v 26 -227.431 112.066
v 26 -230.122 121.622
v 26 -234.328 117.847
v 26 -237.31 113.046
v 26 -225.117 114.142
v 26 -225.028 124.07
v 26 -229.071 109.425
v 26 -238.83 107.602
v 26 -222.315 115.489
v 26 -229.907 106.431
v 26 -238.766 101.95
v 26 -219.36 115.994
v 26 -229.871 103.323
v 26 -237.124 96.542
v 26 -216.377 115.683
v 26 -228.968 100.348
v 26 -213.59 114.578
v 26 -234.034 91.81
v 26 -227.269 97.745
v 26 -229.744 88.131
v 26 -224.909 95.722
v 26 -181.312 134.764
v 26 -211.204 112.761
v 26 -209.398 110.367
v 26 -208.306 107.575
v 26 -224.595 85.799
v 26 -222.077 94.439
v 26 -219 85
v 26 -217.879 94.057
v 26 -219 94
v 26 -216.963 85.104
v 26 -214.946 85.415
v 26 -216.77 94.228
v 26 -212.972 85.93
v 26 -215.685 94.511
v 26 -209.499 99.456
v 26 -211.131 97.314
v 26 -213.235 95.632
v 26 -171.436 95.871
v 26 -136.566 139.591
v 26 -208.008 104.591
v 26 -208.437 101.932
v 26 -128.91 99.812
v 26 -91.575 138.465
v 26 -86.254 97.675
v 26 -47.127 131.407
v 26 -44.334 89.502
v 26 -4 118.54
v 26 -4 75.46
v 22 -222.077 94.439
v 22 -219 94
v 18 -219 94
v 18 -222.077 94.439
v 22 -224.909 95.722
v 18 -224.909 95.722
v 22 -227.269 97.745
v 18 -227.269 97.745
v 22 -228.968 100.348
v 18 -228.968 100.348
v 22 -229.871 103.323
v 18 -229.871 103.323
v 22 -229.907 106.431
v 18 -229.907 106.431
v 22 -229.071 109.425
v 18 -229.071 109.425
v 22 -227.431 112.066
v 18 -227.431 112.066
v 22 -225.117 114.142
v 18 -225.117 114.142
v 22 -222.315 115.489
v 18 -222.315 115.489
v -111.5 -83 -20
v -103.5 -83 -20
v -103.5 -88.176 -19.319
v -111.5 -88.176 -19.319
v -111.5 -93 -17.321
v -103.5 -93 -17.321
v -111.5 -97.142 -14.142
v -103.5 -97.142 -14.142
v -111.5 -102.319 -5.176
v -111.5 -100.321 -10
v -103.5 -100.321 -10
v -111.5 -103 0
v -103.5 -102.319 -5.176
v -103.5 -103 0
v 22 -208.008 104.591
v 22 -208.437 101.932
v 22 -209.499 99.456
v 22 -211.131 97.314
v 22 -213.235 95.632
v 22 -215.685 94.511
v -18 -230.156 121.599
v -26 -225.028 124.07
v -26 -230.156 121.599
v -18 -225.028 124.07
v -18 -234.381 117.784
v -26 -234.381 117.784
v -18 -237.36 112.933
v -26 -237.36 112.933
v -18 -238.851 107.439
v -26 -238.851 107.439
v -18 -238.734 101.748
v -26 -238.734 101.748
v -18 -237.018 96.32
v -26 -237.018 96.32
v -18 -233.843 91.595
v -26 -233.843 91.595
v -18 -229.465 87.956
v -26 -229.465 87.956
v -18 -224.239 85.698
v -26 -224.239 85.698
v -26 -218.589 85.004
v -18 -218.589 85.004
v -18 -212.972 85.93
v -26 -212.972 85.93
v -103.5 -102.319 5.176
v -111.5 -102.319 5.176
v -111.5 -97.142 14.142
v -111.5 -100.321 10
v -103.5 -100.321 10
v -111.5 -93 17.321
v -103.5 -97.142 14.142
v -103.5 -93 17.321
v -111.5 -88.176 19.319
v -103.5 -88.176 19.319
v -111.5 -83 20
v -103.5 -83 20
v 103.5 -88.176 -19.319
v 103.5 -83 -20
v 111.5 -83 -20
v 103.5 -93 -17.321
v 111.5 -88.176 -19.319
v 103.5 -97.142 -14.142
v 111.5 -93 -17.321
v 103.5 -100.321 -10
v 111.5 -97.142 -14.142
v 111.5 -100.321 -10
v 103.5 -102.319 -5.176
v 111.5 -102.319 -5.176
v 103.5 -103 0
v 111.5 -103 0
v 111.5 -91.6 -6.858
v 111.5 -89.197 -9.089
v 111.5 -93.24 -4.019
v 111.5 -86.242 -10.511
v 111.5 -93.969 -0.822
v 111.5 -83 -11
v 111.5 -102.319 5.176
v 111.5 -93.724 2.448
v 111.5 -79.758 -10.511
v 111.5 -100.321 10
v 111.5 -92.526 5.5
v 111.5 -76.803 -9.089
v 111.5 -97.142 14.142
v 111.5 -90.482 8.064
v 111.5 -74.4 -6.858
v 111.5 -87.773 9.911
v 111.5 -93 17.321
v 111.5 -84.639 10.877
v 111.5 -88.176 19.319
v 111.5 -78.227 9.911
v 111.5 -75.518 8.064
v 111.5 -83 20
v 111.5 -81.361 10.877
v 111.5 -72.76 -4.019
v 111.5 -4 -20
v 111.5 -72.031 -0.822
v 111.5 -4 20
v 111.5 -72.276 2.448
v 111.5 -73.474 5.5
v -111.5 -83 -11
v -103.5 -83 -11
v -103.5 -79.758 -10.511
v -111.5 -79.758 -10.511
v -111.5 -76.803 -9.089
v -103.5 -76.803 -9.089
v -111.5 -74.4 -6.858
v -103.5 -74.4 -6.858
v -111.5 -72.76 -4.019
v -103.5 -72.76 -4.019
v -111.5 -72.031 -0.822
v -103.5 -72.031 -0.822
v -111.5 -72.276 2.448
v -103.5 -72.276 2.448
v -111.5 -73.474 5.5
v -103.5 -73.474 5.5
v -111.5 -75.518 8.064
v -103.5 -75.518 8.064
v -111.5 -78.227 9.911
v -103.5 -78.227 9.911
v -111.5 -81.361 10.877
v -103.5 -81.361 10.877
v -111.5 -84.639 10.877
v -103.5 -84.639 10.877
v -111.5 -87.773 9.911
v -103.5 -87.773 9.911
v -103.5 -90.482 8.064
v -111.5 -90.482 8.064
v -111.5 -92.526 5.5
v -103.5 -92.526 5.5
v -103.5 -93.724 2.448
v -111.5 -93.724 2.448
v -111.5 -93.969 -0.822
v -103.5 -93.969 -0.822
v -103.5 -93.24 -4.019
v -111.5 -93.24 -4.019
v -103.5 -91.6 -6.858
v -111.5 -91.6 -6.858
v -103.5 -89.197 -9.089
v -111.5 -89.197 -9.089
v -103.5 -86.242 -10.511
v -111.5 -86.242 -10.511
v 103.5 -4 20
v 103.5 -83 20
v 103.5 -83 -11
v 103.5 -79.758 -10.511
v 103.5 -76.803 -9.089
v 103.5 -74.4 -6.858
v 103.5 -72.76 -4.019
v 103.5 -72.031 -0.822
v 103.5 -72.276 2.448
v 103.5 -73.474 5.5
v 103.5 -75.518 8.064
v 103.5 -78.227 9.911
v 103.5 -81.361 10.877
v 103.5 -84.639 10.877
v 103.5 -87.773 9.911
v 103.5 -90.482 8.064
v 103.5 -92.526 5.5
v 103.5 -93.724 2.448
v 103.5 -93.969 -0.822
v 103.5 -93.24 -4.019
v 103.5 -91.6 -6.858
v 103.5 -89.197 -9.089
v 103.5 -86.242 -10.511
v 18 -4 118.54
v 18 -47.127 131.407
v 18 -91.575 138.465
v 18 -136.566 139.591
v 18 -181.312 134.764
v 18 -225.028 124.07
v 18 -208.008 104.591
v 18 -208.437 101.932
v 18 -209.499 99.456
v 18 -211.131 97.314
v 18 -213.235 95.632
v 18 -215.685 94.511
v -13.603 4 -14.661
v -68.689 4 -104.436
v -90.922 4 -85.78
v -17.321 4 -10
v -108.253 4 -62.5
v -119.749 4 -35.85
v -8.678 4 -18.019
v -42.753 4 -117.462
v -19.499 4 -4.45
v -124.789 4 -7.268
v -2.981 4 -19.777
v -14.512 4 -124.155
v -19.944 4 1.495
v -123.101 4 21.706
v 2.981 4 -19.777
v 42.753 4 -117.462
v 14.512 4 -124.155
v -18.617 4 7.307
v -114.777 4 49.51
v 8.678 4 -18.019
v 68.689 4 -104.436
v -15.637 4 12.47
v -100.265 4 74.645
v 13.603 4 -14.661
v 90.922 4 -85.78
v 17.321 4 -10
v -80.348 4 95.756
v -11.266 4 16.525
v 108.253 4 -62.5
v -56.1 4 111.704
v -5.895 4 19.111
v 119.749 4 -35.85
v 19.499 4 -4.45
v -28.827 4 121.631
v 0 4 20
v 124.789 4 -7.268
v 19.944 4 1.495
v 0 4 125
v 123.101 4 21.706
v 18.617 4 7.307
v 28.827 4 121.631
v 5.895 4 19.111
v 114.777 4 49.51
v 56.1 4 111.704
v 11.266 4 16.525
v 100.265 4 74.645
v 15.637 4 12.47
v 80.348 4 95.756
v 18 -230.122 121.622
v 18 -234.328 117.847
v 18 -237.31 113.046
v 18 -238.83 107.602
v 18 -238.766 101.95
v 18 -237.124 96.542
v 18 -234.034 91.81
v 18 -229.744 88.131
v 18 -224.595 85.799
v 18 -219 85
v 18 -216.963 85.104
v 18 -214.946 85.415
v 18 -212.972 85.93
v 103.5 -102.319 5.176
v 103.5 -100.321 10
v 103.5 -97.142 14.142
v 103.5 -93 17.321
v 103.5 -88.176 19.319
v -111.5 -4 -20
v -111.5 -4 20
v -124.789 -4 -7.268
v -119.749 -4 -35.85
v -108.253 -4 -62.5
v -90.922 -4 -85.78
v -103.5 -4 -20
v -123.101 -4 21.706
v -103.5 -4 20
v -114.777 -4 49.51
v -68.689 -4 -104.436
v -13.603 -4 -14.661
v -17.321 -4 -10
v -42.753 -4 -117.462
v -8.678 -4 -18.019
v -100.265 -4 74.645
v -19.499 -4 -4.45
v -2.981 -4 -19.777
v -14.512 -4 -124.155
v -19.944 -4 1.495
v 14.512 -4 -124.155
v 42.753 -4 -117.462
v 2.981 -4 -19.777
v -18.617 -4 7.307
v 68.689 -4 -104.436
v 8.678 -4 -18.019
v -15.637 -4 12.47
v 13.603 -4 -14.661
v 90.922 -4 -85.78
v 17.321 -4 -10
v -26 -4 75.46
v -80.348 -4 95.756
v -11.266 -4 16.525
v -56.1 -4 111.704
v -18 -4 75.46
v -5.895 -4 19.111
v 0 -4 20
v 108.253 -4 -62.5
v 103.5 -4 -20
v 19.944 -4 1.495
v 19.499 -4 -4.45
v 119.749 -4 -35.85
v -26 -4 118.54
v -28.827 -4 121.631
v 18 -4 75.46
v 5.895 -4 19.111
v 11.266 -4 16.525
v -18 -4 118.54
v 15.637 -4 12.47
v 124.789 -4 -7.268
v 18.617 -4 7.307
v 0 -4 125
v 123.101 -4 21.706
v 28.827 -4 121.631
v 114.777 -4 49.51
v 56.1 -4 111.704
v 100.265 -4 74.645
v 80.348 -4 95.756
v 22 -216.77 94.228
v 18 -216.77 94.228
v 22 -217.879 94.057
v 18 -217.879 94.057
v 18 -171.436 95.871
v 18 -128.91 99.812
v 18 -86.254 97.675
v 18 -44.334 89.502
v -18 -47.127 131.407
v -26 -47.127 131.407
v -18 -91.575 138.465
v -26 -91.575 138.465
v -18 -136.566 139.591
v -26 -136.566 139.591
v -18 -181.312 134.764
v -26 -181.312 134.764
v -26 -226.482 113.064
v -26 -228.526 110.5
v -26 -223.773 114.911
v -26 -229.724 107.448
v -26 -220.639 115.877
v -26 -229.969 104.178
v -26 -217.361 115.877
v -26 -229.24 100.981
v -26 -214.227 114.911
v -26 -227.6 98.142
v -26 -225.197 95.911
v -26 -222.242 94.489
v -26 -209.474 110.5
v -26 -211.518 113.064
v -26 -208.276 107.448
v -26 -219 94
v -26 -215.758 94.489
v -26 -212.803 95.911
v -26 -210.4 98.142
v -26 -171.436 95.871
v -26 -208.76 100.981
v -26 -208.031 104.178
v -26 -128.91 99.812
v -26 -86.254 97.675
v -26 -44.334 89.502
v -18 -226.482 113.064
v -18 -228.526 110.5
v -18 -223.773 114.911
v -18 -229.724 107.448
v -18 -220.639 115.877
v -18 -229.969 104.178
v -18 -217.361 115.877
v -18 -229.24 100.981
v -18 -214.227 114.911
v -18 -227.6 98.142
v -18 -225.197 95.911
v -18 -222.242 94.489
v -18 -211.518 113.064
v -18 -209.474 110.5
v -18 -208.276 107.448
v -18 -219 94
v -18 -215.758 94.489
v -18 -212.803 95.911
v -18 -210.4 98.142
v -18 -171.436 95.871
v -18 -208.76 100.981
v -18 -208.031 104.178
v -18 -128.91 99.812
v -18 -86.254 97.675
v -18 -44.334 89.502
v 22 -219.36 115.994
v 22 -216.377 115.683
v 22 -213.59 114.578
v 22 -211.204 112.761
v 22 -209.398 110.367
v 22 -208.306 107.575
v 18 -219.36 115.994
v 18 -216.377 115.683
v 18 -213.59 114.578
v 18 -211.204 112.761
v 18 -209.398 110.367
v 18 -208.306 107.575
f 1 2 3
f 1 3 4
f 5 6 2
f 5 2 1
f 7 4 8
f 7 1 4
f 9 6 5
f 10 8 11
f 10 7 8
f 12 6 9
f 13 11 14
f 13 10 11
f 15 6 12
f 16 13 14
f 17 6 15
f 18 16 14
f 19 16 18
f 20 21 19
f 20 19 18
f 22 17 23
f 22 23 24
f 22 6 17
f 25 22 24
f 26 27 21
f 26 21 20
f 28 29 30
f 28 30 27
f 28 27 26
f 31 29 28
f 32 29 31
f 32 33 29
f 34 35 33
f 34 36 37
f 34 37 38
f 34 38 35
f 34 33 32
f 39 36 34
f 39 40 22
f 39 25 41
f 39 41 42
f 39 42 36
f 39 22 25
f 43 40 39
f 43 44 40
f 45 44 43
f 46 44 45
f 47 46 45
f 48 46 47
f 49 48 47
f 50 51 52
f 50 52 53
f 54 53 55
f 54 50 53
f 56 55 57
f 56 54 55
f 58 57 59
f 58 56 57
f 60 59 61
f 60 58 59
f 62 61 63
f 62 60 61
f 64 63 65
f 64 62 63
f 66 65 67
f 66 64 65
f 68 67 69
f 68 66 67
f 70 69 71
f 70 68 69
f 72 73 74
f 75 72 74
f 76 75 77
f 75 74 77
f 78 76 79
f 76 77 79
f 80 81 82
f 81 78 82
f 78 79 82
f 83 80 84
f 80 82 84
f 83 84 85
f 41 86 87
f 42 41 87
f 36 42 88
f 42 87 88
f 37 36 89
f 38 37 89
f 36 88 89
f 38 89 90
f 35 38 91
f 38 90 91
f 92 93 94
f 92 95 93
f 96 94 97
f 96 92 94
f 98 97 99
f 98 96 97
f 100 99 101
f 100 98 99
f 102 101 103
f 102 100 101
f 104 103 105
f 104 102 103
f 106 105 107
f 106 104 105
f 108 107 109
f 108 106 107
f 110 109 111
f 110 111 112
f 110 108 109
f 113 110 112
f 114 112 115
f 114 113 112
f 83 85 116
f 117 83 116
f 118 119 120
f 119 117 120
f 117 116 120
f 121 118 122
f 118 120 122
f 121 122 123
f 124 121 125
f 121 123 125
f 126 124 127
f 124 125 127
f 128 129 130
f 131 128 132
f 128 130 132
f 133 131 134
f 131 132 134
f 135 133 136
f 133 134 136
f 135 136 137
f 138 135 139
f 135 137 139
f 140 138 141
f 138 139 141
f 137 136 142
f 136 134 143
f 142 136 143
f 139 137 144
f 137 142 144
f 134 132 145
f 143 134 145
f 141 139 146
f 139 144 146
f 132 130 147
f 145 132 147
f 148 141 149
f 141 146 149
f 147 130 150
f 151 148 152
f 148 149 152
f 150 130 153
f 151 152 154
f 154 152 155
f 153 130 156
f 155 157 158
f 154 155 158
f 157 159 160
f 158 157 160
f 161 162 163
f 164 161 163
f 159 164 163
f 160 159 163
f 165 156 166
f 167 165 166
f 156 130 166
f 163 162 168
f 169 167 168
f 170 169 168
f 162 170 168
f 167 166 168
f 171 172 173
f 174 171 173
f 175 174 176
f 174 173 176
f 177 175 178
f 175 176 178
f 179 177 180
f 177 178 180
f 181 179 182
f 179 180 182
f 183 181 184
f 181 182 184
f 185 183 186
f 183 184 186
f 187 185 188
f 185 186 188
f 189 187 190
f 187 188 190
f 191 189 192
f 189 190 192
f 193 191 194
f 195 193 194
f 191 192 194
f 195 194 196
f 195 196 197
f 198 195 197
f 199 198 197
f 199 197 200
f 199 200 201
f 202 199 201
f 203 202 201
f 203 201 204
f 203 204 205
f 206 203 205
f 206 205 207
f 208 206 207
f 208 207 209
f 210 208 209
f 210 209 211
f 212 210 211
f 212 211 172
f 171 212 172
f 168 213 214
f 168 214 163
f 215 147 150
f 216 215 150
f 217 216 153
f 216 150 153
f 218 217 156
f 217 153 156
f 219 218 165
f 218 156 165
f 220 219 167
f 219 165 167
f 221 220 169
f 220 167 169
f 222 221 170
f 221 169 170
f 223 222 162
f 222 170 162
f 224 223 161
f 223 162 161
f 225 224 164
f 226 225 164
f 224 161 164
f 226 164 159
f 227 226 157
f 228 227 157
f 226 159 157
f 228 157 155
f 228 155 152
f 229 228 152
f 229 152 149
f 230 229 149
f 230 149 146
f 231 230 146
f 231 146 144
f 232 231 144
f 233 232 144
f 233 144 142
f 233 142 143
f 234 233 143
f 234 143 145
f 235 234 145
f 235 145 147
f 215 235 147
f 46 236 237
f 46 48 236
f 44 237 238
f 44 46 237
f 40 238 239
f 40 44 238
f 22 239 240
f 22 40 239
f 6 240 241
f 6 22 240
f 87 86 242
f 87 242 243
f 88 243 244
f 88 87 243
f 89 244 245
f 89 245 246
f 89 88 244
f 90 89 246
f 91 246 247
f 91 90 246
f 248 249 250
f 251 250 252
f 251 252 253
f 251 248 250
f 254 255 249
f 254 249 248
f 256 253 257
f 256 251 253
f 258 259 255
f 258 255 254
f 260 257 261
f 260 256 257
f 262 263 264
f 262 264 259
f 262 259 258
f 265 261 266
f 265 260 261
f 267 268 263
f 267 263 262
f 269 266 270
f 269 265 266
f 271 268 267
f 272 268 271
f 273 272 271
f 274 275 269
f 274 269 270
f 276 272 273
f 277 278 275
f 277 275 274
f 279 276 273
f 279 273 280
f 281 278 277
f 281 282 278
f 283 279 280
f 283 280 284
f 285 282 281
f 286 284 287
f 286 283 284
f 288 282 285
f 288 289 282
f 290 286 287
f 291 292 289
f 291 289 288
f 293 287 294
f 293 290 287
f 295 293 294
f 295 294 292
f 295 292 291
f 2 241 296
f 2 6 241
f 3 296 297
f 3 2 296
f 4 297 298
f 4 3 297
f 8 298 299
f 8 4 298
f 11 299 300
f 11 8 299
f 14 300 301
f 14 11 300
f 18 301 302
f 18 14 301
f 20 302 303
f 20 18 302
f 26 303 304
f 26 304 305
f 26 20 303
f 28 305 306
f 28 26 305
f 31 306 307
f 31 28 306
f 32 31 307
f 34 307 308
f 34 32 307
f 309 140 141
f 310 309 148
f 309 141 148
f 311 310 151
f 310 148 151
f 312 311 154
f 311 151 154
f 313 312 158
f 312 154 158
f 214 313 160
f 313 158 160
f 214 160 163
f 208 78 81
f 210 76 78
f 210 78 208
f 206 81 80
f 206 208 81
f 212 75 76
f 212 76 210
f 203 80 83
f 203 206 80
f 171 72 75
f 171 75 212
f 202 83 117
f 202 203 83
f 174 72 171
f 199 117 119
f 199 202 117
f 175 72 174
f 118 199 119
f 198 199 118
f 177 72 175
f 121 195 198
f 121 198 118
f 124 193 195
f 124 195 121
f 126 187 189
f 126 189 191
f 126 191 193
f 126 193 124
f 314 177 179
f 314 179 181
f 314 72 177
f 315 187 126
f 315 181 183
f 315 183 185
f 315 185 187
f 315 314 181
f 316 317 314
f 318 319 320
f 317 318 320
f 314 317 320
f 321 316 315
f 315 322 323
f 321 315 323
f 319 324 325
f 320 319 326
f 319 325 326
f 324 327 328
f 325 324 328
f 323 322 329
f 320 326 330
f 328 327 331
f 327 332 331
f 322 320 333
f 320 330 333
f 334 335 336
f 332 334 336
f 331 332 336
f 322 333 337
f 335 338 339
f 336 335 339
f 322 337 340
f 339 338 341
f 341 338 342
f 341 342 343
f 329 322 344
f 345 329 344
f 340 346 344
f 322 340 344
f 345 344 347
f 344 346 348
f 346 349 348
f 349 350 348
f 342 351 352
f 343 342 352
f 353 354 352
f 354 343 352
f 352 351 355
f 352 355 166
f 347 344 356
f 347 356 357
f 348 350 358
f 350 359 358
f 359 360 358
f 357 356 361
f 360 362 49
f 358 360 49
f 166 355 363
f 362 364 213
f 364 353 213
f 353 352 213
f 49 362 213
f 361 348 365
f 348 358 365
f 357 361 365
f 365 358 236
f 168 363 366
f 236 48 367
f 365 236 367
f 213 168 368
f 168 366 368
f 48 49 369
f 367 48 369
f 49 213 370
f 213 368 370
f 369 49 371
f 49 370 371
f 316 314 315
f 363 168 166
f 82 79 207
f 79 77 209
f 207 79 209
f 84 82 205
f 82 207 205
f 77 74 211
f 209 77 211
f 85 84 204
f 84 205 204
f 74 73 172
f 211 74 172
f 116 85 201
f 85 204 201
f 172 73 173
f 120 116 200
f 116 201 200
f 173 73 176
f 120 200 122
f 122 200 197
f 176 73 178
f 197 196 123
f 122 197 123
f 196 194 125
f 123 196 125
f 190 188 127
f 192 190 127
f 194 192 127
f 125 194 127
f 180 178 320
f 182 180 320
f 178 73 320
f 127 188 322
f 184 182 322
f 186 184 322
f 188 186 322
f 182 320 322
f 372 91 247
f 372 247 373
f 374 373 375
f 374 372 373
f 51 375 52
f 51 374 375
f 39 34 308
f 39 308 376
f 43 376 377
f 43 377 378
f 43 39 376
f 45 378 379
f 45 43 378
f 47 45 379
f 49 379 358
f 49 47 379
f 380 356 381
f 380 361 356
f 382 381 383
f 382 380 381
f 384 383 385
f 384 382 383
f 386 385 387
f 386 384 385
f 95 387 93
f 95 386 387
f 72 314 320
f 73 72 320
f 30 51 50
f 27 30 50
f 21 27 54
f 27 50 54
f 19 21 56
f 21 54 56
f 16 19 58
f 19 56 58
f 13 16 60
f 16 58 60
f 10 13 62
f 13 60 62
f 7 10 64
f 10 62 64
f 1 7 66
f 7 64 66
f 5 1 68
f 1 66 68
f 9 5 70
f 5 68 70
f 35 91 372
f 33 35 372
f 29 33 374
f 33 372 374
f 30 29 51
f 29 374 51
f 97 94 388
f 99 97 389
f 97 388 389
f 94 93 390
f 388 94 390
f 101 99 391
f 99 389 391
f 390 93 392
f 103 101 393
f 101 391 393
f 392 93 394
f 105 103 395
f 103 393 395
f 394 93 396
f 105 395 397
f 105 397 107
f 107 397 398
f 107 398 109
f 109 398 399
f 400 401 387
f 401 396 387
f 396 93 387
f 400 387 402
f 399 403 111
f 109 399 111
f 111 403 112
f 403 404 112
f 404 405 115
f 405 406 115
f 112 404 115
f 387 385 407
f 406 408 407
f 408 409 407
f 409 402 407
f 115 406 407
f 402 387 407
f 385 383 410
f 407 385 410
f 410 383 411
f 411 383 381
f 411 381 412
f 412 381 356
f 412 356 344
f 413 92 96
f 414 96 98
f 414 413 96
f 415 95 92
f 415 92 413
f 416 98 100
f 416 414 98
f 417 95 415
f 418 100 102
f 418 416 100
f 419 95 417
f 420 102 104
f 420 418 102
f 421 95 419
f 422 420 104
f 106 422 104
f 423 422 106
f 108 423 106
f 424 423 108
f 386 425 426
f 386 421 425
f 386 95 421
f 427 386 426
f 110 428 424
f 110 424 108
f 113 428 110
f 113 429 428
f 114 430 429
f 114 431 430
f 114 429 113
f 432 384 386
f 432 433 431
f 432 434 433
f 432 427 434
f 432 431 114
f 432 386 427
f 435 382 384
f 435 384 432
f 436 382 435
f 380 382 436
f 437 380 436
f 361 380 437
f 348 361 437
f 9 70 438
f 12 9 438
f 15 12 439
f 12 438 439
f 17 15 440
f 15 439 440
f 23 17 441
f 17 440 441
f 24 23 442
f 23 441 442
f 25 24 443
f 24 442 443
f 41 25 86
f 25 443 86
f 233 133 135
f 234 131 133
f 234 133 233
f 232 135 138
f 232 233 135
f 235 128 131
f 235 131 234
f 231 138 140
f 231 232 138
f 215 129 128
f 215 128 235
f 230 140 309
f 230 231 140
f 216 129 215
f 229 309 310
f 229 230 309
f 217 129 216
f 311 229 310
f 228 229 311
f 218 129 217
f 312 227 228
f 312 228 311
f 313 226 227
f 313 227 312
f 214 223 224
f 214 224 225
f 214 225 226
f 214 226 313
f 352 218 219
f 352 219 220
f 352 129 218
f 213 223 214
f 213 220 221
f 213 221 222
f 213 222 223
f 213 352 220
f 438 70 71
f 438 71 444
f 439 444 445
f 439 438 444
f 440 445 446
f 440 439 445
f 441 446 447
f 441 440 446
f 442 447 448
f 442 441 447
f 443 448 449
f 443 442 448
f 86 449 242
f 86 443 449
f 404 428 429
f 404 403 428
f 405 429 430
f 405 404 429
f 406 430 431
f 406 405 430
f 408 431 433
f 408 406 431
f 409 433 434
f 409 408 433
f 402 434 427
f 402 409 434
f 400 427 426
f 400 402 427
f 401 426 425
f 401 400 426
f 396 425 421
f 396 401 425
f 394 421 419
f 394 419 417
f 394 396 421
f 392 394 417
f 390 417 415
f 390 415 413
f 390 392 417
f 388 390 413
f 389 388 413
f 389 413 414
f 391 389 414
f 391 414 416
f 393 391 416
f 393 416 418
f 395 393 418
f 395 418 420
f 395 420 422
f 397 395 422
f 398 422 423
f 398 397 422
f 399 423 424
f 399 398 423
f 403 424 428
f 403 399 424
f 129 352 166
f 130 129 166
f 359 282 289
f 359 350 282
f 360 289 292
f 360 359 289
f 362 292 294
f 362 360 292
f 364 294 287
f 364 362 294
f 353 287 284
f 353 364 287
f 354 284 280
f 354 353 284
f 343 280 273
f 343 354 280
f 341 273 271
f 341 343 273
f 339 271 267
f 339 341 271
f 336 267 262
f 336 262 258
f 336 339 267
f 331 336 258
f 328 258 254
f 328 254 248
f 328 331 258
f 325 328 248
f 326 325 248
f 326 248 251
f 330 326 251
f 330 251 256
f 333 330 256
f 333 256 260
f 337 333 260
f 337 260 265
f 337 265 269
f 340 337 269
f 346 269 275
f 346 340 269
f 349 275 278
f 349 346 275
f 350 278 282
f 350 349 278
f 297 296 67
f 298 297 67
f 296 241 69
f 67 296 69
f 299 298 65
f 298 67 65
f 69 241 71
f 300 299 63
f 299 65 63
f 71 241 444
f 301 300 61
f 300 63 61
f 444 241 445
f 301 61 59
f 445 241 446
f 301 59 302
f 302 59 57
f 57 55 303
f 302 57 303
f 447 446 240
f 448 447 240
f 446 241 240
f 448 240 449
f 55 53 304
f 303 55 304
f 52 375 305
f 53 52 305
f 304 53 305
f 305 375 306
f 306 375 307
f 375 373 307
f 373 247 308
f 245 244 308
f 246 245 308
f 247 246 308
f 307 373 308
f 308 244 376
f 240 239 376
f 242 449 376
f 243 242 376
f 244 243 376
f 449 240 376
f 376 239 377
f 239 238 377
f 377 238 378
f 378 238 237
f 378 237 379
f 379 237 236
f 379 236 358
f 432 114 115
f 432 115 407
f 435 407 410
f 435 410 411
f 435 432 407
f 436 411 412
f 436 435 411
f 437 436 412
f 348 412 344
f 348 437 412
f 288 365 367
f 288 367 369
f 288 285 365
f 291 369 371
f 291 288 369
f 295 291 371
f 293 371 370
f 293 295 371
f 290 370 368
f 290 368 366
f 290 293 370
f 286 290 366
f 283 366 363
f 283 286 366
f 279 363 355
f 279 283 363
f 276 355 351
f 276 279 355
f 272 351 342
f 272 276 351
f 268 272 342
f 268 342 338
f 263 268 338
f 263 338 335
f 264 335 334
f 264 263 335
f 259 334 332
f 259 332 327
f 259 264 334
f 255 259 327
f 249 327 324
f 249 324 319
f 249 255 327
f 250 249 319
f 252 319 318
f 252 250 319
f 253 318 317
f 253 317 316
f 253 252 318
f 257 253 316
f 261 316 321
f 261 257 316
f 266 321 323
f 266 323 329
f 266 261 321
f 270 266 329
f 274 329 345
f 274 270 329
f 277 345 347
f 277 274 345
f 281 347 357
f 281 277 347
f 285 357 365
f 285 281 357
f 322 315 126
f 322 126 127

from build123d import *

# Parameters (mm, degrees)
SKETCH1_R           = 125
SKETCH1_R_2         = 20
BOSS_EXTRUDE1_DEPTH = 4
SKETCH2_W           = 8
SKETCH2_H           = 40
BOSS_EXTRUDE2_DEPTH = 99
SKETCH3_R           = 11
CUT_EXTRUDE1_DEPTH  = 287.646559372
BOSS_EXTRUDE3_START = 22
SKETCH5_R           = 11
BOSS_EXTRUDE3_DEPTH = 4
BOSS_EXTRUDE4_START = -22
SKETCH5_3_R         = 11
BOSS_EXTRUDE4_DEPTH = 4


with BuildPart() as part:
    # Sketch1 → Boss-Extrude1 (new, symmetric)
    with BuildSketch(Plane(origin=(0, 0, 0), x_dir=(1, 0, 0), z_dir=(0, 1, 0))):
        Circle(SKETCH1_R)
        Circle(SKETCH1_R_2, mode=Mode.SUBTRACT)
    extrude(amount=BOSS_EXTRUDE1_DEPTH, both=True)

    # Sketch2 → Boss-Extrude2 (add)
    with BuildSketch(Plane.XZ.offset(4)):
        with Locations((107.5, 0)):
            Rectangle(SKETCH2_W, SKETCH2_H)
        with Locations((-107.5, 0)):
            Rectangle(SKETCH2_W, SKETCH2_H)
    extrude(amount=BOSS_EXTRUDE2_DEPTH)

    # Sketch3 → Cut-Extrude1 (cut, through all)
    with BuildSketch(Plane(origin=(111.5, 0, 0), x_dir=(0, 0, -1), z_dir=(1, 0, 0))):
        with Locations((0, -83)):
            Circle(SKETCH3_R)
        with BuildLine():
            Line((20, -103), (20, -83))
            ThreePointArc((20, -83), (14.142135624, -97.142135624), (0, -103))
            Line((0, -103), (20, -103))
        make_face()
        with BuildLine():
            ThreePointArc((0, -103), (-14.142135624, -97.142135624), (-20, -83))
            Line((-20, -83), (-20, -103))
            Line((-20, -103), (0, -103))
        make_face()
    extrude(amount=-CUT_EXTRUDE1_DEPTH, mode=Mode.SUBTRACT)

    # Sketch5 → Boss-Extrude3 (add, symmetric)
    with BuildSketch(Plane(origin=(0, 0, 0), x_dir=(0, 0, -1), z_dir=(1, 0, 0)).offset(BOSS_EXTRUDE3_START)):
        with BuildLine():
            ThreePointArc((-118.540084836, -4), (-139.773172479, -114.051826294), (-124.070028997, -225.02776858))
            ThreePointArc((-124.070028997, -225.02776858), (-98.97223142, -238.070028997), (-85.929971003, -212.97223142))
            ThreePointArc((-85.929971003, -212.97223142), (-99.503702638, -107.543747619), (-75.459915164, -4))
            Line((-75.459915164, -4), (-118.540084836, -4))
        make_face()
        with Locations((-105, -219)):
            Circle(SKETCH5_R, mode=Mode.SUBTRACT)
    extrude(amount=BOSS_EXTRUDE3_DEPTH, both=True)

    # Sketch5<3> → Boss-Extrude4 (add, symmetric)
    with BuildSketch(Plane(origin=(0, 0, 0), x_dir=(0, 0, -1), z_dir=(1, 0, 0)).offset(BOSS_EXTRUDE4_START)):
        with BuildLine():
            ThreePointArc((-118.540084836, -4), (-139.773172479, -114.051826294), (-124.070028997, -225.02776858))
            ThreePointArc((-124.070028997, -225.02776858), (-98.97223142, -238.070028997), (-85.929971003, -212.97223142))
            ThreePointArc((-85.929971003, -212.97223142), (-99.503702638, -107.543747619), (-75.459915164, -4))
            Line((-75.459915164, -4), (-118.540084836, -4))
        make_face()
        with Locations((-105, -219)):
            Circle(SKETCH5_3_R, mode=Mode.SUBTRACT)
    extrude(amount=BOSS_EXTRUDE4_DEPTH, both=True)


solid = part.part
